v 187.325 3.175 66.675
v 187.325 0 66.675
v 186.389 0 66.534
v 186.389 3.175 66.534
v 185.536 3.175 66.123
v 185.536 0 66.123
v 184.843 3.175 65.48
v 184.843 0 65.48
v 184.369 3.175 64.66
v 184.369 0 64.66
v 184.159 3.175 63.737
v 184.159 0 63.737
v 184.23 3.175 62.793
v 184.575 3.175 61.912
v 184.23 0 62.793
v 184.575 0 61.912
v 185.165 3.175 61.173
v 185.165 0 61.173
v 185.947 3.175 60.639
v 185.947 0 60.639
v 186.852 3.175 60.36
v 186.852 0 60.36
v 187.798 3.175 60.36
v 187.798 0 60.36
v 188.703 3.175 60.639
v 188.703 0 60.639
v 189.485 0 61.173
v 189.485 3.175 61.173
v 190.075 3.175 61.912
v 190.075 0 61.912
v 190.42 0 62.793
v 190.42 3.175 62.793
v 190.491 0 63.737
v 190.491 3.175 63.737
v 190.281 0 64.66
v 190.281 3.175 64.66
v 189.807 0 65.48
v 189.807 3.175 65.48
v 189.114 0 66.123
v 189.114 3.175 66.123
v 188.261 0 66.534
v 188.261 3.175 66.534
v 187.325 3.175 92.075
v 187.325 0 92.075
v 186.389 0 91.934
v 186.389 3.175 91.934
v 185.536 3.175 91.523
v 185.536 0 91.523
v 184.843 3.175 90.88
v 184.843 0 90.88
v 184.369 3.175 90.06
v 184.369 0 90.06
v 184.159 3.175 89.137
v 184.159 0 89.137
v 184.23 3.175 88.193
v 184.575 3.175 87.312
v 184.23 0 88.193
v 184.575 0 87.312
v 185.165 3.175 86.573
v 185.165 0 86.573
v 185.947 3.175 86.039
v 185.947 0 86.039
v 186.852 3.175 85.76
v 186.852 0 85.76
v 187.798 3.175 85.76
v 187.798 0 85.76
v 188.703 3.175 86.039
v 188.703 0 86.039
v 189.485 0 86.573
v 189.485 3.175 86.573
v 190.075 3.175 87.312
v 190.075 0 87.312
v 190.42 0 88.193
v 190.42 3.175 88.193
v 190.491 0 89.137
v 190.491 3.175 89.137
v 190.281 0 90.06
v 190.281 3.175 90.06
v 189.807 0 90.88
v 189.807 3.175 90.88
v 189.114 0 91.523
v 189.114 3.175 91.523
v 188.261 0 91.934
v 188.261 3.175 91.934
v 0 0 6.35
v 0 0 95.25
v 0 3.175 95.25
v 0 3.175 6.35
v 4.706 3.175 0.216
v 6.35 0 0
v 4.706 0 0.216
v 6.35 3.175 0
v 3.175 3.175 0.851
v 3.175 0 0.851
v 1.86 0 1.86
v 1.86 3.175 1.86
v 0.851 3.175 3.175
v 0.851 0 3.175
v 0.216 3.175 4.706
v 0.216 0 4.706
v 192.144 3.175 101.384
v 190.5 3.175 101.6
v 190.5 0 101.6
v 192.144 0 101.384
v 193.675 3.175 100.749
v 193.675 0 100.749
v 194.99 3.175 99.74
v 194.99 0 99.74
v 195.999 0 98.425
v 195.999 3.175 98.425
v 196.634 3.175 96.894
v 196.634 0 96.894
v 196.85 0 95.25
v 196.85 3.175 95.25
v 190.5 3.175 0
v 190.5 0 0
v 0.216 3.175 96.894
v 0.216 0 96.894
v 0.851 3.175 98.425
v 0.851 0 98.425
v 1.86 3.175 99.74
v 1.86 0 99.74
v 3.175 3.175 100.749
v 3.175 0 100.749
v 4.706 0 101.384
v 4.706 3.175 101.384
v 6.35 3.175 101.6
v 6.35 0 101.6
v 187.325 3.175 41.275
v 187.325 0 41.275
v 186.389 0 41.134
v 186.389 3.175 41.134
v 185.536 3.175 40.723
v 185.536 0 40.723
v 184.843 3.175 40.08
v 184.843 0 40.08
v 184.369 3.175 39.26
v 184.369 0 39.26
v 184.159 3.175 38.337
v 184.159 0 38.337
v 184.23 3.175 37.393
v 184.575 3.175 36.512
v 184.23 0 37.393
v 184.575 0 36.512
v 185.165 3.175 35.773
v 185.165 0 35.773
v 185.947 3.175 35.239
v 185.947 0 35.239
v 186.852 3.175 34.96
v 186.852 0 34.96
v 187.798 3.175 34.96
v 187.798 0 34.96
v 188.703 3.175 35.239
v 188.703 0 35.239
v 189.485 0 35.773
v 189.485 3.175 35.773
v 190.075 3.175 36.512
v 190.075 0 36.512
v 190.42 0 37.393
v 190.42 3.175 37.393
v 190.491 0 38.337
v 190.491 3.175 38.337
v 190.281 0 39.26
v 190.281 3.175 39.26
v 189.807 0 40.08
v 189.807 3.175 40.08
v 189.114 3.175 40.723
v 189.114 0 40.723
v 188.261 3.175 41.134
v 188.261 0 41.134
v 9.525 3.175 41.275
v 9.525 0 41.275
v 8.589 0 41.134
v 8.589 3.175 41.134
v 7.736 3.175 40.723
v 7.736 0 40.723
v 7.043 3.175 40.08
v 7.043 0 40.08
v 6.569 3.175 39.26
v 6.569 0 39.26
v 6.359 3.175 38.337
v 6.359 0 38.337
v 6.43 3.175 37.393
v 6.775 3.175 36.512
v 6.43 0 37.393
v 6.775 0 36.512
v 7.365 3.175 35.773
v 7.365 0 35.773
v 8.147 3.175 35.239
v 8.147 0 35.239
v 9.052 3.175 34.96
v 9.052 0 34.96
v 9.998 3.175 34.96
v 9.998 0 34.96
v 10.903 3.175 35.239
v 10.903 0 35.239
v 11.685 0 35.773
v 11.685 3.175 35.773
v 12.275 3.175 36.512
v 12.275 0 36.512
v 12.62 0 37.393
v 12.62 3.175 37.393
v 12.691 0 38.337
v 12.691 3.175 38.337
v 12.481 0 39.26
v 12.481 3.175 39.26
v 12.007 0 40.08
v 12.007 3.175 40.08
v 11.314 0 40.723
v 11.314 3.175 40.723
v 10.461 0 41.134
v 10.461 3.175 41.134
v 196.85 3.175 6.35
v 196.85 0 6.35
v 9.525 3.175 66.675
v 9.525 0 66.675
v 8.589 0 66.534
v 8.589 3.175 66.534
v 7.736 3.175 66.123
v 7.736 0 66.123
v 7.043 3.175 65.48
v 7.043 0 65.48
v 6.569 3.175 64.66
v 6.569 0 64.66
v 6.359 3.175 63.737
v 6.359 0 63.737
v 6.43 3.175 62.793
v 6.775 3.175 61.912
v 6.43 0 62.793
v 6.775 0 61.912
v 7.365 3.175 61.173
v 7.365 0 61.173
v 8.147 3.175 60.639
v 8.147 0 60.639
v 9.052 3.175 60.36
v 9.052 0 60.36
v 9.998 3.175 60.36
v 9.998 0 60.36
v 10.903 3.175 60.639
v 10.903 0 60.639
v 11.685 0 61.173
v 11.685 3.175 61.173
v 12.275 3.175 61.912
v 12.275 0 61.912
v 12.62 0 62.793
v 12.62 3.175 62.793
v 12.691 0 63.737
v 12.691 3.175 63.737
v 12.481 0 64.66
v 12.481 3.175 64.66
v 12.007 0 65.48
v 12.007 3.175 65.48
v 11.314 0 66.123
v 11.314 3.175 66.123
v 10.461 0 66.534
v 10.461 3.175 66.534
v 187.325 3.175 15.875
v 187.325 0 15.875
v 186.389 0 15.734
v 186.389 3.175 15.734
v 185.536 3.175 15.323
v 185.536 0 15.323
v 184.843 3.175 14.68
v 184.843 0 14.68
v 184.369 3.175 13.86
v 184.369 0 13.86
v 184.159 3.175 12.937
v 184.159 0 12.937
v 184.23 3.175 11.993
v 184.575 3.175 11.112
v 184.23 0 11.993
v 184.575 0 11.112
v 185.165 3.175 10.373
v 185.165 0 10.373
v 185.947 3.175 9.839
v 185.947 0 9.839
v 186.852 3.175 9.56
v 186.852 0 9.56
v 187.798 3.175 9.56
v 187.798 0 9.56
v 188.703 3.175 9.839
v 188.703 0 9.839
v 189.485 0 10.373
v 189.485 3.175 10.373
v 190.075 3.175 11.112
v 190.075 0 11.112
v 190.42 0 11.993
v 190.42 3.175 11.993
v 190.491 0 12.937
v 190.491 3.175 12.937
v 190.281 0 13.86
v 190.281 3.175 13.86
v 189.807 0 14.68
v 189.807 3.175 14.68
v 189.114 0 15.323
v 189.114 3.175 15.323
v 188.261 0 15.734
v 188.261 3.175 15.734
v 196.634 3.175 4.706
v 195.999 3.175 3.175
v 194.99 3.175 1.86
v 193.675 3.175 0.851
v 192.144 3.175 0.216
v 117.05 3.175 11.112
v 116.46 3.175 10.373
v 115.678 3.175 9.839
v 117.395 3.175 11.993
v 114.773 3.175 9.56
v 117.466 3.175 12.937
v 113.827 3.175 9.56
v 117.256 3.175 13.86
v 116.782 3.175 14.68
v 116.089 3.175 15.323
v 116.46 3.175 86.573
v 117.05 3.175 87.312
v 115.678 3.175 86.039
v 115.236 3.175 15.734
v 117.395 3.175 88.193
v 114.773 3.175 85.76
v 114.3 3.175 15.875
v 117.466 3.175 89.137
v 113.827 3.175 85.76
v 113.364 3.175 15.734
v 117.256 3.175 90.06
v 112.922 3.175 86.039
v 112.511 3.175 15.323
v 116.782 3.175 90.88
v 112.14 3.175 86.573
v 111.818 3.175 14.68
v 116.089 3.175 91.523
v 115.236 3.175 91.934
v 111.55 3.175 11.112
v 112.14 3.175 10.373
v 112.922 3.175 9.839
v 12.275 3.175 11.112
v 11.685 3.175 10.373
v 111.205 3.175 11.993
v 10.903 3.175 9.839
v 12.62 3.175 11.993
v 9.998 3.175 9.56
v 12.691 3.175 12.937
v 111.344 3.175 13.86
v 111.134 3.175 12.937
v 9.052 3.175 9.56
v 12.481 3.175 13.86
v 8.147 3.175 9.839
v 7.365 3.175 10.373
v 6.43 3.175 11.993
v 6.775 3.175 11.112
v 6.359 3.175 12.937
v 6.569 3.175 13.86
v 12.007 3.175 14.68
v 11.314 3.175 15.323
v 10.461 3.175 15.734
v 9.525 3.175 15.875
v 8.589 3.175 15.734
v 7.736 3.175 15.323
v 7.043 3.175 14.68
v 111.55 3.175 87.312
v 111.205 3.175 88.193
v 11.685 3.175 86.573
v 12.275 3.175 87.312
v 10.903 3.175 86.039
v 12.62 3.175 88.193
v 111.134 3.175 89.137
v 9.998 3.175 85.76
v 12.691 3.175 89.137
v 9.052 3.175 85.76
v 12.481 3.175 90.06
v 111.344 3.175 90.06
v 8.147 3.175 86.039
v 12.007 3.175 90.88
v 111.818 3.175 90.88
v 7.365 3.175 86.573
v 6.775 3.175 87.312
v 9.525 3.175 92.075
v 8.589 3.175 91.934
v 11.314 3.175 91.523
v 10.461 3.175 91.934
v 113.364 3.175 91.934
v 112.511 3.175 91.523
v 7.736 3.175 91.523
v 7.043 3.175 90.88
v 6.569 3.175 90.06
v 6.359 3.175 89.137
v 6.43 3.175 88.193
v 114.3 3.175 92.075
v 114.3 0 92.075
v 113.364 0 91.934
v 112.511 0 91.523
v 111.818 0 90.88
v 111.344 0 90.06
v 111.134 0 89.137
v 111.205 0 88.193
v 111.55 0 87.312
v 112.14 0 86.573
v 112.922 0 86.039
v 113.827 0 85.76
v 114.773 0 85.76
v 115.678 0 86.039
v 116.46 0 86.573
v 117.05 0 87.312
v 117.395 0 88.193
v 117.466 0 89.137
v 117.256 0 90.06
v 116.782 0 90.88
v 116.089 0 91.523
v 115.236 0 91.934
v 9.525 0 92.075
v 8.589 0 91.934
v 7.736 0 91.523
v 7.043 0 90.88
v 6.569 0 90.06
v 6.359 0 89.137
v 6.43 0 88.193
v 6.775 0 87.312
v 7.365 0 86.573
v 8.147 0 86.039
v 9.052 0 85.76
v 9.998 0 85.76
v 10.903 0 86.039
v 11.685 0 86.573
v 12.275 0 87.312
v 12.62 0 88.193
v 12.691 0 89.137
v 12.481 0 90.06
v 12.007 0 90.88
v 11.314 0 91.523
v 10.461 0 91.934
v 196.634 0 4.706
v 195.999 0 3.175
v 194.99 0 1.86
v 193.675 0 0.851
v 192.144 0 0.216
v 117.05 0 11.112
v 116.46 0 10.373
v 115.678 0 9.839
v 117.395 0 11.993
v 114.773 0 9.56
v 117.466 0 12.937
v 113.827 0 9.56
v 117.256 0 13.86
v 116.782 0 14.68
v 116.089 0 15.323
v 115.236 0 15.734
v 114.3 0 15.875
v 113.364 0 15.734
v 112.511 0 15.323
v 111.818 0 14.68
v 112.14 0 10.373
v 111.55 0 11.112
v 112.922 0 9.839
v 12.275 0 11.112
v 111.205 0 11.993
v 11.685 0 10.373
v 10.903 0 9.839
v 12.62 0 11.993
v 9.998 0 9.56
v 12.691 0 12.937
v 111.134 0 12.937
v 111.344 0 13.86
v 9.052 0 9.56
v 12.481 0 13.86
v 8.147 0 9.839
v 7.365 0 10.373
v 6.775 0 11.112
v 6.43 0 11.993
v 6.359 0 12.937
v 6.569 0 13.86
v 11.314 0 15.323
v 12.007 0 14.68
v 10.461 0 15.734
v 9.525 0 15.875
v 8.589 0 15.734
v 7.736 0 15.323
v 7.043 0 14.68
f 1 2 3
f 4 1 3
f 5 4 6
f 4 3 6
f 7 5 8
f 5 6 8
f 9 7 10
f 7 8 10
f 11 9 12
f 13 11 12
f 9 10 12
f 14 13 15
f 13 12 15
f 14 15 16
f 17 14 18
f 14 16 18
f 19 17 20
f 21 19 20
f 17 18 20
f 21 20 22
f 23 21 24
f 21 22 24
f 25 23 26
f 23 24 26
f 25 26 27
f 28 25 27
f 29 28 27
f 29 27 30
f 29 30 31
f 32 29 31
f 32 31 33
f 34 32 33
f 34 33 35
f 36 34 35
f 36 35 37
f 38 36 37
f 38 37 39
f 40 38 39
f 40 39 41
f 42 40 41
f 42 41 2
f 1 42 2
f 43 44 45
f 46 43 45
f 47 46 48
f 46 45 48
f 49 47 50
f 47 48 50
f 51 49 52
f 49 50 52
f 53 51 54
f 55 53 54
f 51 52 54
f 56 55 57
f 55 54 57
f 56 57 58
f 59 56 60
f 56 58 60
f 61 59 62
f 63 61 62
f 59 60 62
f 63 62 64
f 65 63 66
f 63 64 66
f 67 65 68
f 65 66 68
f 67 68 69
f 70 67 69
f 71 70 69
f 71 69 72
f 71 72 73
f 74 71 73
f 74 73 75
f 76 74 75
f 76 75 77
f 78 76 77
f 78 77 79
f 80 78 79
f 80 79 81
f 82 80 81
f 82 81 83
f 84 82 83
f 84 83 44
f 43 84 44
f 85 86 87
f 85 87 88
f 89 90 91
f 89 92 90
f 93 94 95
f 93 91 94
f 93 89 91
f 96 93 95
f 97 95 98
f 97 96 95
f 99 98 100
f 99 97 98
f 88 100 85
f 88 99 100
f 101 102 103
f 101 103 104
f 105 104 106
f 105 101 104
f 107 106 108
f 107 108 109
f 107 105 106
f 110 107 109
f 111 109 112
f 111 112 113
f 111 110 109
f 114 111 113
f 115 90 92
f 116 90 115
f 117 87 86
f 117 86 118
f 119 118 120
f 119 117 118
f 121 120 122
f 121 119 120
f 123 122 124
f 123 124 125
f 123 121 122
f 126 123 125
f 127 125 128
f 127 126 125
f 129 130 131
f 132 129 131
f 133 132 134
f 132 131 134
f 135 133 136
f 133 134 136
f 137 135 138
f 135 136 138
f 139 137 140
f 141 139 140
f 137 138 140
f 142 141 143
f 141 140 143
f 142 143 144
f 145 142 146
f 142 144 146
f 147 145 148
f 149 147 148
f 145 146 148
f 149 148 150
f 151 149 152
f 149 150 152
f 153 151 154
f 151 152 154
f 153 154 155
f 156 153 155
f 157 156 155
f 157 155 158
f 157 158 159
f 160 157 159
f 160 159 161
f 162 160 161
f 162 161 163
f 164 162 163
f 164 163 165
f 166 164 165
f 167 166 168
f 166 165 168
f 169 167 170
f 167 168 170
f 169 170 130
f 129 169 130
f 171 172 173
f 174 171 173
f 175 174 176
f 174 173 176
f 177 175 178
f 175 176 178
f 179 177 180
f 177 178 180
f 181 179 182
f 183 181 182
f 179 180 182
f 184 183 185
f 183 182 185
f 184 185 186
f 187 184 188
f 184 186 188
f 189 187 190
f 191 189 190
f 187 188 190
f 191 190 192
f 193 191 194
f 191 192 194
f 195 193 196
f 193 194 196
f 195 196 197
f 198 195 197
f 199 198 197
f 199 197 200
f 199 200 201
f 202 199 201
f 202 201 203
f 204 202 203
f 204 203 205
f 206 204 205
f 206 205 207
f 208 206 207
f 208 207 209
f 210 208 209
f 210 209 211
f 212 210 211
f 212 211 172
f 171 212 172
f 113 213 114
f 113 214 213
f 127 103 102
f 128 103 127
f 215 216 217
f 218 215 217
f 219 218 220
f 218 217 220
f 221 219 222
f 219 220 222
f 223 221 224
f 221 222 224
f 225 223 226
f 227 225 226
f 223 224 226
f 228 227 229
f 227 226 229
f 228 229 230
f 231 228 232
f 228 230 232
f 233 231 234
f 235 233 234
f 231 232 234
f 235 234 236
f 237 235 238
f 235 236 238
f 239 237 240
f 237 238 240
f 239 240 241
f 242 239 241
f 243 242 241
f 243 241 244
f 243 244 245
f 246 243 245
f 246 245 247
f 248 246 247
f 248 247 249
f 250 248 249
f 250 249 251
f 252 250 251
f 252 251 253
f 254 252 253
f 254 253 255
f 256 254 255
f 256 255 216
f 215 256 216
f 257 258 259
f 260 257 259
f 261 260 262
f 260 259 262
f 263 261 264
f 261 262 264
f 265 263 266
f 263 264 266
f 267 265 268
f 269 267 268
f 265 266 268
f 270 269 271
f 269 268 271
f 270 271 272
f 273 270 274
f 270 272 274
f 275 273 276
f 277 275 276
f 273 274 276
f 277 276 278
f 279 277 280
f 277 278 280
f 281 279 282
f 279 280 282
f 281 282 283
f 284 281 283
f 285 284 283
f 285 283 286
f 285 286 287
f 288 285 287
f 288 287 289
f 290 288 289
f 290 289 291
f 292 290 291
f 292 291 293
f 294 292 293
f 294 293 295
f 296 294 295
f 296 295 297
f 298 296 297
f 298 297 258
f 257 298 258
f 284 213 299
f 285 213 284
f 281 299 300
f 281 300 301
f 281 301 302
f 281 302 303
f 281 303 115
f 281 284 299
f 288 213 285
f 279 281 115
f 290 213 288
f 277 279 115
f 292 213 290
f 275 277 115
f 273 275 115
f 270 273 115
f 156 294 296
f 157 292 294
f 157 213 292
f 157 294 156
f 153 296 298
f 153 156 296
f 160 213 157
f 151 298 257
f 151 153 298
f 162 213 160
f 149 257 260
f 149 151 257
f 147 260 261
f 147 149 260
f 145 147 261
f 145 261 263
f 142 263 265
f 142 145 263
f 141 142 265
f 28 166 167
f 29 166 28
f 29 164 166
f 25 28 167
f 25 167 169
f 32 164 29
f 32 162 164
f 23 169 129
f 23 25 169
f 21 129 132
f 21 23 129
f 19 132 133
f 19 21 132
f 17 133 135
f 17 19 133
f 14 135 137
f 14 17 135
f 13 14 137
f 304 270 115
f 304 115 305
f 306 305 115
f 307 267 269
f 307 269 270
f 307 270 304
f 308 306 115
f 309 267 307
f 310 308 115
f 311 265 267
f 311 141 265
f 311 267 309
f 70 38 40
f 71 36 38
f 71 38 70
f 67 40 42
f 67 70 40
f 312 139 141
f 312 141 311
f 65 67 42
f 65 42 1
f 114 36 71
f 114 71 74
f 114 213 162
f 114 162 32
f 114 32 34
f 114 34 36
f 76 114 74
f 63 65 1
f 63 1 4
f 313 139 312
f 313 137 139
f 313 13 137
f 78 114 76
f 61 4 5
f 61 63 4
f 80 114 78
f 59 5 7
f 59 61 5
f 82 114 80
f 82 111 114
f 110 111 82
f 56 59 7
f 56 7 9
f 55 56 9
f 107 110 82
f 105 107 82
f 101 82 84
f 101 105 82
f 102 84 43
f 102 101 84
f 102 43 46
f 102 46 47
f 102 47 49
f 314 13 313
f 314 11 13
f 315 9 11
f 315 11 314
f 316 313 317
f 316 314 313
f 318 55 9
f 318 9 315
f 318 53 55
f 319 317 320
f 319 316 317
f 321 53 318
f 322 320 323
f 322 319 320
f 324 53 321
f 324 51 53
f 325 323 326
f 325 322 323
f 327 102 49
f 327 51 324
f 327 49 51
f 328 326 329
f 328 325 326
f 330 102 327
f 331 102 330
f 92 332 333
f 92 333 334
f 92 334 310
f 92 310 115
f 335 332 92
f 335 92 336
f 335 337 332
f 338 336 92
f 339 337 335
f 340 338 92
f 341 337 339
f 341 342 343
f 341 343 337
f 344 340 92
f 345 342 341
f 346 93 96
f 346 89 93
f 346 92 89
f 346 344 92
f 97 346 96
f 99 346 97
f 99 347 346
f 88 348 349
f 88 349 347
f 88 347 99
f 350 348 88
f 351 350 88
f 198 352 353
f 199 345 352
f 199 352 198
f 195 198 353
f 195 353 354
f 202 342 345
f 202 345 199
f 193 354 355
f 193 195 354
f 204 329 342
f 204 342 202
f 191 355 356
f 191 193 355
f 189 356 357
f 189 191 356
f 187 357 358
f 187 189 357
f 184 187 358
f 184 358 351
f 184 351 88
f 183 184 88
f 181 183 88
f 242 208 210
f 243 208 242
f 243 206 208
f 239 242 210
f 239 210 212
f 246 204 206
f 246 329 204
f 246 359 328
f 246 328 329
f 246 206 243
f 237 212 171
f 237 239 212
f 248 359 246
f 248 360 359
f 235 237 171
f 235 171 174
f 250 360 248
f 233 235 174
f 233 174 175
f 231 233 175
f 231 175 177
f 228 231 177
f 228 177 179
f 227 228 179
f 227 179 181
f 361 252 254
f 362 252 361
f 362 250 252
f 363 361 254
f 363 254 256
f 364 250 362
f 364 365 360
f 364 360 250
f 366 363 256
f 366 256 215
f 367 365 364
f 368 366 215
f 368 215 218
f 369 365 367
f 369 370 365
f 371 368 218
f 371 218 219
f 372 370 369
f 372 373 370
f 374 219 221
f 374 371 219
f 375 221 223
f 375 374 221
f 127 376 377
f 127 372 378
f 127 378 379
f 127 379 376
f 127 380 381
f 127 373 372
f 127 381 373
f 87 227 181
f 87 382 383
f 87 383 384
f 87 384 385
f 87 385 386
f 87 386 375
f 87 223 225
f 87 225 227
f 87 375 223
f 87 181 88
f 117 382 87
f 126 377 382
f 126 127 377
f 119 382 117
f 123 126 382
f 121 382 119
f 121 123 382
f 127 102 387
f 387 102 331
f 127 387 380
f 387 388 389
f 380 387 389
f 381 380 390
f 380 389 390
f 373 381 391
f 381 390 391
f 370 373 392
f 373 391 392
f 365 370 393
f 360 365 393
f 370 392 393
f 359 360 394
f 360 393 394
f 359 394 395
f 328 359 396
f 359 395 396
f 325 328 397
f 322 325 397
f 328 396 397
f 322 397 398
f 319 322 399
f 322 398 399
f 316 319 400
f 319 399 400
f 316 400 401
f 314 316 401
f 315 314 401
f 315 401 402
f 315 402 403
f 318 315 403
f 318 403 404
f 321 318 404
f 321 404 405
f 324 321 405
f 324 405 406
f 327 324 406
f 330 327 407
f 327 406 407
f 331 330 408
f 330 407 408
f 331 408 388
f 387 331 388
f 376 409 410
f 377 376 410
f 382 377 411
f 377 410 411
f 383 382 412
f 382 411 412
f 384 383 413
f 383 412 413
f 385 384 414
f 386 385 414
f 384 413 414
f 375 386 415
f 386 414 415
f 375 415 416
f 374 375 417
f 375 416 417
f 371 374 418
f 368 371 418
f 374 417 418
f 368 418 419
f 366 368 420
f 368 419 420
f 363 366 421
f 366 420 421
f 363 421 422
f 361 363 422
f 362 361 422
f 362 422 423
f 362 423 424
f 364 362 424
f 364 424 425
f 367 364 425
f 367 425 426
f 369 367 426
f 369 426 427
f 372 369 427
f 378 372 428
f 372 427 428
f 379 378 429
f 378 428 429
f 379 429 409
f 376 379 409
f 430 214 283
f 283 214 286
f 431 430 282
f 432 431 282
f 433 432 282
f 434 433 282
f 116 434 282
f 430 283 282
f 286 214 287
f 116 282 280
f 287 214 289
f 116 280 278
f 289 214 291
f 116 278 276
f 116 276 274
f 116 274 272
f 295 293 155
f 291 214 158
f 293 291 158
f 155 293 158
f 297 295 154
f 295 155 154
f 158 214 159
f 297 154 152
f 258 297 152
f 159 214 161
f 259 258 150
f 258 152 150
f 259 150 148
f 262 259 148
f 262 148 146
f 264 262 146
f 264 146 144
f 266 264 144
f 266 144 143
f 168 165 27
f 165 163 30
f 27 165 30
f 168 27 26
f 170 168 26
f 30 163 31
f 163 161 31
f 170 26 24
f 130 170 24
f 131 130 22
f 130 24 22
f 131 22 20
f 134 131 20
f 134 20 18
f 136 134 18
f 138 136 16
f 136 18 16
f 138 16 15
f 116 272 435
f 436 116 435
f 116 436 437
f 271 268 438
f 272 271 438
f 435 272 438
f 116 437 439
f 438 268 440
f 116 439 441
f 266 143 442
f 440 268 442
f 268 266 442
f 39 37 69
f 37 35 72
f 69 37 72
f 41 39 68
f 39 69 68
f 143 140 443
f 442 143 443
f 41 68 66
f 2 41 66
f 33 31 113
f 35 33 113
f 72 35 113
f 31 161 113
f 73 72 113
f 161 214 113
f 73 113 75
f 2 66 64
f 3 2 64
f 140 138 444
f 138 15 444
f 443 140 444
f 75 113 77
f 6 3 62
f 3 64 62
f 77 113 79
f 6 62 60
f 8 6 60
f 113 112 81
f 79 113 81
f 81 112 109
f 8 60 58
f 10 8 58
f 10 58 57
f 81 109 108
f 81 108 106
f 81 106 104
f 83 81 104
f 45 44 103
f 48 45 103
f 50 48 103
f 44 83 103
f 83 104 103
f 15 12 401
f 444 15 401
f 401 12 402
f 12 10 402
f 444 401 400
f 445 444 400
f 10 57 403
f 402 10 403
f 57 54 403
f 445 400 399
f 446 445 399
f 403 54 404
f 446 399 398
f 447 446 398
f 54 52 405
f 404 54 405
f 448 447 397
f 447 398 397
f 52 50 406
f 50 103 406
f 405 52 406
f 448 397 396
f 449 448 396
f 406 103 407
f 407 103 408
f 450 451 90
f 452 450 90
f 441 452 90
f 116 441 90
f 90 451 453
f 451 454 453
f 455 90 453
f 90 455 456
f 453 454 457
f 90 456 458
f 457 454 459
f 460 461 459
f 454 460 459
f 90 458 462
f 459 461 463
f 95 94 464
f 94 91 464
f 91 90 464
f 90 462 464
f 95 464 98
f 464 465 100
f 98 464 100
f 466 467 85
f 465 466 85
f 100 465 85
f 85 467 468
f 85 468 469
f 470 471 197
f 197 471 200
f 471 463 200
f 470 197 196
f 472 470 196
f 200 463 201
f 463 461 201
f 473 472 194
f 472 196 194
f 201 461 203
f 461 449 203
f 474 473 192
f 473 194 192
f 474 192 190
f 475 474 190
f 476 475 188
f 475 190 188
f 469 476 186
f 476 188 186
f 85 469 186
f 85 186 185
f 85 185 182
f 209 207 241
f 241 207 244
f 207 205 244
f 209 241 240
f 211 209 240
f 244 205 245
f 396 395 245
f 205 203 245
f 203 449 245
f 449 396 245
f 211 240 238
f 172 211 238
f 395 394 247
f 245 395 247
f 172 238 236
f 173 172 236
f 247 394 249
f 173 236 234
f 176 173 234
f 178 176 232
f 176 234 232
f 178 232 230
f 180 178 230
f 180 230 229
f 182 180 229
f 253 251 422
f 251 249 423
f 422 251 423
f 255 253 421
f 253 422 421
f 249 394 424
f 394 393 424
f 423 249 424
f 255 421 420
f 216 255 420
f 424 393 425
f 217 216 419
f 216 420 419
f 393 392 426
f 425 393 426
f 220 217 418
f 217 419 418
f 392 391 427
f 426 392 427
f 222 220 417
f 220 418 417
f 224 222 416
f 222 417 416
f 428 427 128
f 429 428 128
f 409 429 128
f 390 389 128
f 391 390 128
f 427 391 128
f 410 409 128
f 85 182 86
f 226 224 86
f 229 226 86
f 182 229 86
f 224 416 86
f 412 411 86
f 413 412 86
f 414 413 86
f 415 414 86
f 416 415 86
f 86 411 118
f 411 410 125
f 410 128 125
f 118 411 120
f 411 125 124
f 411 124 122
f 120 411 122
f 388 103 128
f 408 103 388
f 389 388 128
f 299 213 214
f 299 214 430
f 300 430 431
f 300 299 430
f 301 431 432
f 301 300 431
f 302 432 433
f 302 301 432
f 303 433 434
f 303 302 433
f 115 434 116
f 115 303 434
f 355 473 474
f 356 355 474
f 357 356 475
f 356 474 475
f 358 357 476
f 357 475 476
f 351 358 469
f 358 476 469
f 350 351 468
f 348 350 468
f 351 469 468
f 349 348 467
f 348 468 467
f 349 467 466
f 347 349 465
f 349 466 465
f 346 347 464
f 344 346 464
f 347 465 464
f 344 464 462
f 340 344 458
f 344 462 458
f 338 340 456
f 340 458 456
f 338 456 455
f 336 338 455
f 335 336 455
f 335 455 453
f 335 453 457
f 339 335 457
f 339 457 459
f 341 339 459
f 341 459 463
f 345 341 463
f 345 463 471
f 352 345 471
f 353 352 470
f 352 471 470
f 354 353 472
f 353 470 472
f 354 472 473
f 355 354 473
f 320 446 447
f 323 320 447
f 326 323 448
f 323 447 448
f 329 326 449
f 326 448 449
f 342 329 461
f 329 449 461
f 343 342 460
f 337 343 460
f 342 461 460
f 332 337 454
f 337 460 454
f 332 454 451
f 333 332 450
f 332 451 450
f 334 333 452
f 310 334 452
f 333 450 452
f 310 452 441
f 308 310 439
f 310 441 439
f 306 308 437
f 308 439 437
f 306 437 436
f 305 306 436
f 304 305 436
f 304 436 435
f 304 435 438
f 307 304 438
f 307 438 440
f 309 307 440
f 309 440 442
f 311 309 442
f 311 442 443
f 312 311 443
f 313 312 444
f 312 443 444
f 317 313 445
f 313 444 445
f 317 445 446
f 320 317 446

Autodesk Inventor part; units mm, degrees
ref_plane "YZ Plane" through (0, 0, 0) normal (1, 0, 0) x (0, 1, 0)
ref_plane "XZ Plane" through (0, 0, 0) normal (0, 1, 0) x (-1, 0, 0)
ref_plane "XY Plane" through (0, 0, 0) normal (0, 0, 1) x (1, 0, 0)
sketch "Sketch1" plane through (0, 0, 0) normal (0, 1, 0) x (-1, 0, 0)
  line L0 (0, 0) -> (-196.85, 0)
  line L1 (-196.85, 0) -> (-196.85, 101.6)
  line L2 (-196.85, 101.6) -> (0, 101.6)
  line L3 (0, 101.6) -> (0, 0)
  dimension "d0" = 196.85
  dimension "d1" = 101.6
extrude "Plate1" add sketch "Sketch1" along normal blind 3.175
hole "Hole1" at (9.525, 3.175, 12.7) direction (0, -1, 0) diameter 6.35 end through all
hole "Hole2" at (187.325, 3.175, 12.7) direction (0, -1, 0) diameter 6.35 end through all
pattern_linear "Rectangular Pattern1" count 4 spacing 25.4 along (0, 0, 1) of "Hole1"
pattern_linear "Rectangular Pattern2" count 4 spacing 25.4 along (0, 0, 1) of "Hole2"
fillet "Fillet1" radius 6.35 1 edges at (0, 1.5875, 101.6)
fillet "Fillet2" radius 6.35 1 edges at (0, 1.5875, 0)
fillet "Fillet3" radius 6.35 1 edges at (196.85, 1.5875, 101.6)
fillet "Fillet4" radius 6.35 1 edges at (196.85, 1.5875, 0)
hole "Hole3" at (114.3, 3.175, 12.7) direction (0, -1, 0) diameter 6.35 end through all
pattern_linear "Rectangular Pattern3" count 2 spacing 76.2 along (0, 0, 1) of "Hole3"
equation "\"d10\" = Thickness"
equation "\"d19\" = Thickness"
equation "\"d38\" = Thickness"
equation "\"BendRadius\" = Thickness"
equation "\"BendReliefWidth\" = Thickness"
equation "\"BendReliefDepth\" = 0.5 * Thickness"
equation "\"CornerReliefSize\" = 4 * Thickness"
equation "\"MinimumRemnant\" = 2 * Thickness"
equation "\"TransitionRadius\" = BendRadius"
equation "\"JacobiRadiusSize\" = BendRadius"
equation "\"GapSize\" = Thickness"
equation "\"d2\" = BendRadius"
equation "\"Thickness\" = 3.175"
properties part number "Motor Mount"
